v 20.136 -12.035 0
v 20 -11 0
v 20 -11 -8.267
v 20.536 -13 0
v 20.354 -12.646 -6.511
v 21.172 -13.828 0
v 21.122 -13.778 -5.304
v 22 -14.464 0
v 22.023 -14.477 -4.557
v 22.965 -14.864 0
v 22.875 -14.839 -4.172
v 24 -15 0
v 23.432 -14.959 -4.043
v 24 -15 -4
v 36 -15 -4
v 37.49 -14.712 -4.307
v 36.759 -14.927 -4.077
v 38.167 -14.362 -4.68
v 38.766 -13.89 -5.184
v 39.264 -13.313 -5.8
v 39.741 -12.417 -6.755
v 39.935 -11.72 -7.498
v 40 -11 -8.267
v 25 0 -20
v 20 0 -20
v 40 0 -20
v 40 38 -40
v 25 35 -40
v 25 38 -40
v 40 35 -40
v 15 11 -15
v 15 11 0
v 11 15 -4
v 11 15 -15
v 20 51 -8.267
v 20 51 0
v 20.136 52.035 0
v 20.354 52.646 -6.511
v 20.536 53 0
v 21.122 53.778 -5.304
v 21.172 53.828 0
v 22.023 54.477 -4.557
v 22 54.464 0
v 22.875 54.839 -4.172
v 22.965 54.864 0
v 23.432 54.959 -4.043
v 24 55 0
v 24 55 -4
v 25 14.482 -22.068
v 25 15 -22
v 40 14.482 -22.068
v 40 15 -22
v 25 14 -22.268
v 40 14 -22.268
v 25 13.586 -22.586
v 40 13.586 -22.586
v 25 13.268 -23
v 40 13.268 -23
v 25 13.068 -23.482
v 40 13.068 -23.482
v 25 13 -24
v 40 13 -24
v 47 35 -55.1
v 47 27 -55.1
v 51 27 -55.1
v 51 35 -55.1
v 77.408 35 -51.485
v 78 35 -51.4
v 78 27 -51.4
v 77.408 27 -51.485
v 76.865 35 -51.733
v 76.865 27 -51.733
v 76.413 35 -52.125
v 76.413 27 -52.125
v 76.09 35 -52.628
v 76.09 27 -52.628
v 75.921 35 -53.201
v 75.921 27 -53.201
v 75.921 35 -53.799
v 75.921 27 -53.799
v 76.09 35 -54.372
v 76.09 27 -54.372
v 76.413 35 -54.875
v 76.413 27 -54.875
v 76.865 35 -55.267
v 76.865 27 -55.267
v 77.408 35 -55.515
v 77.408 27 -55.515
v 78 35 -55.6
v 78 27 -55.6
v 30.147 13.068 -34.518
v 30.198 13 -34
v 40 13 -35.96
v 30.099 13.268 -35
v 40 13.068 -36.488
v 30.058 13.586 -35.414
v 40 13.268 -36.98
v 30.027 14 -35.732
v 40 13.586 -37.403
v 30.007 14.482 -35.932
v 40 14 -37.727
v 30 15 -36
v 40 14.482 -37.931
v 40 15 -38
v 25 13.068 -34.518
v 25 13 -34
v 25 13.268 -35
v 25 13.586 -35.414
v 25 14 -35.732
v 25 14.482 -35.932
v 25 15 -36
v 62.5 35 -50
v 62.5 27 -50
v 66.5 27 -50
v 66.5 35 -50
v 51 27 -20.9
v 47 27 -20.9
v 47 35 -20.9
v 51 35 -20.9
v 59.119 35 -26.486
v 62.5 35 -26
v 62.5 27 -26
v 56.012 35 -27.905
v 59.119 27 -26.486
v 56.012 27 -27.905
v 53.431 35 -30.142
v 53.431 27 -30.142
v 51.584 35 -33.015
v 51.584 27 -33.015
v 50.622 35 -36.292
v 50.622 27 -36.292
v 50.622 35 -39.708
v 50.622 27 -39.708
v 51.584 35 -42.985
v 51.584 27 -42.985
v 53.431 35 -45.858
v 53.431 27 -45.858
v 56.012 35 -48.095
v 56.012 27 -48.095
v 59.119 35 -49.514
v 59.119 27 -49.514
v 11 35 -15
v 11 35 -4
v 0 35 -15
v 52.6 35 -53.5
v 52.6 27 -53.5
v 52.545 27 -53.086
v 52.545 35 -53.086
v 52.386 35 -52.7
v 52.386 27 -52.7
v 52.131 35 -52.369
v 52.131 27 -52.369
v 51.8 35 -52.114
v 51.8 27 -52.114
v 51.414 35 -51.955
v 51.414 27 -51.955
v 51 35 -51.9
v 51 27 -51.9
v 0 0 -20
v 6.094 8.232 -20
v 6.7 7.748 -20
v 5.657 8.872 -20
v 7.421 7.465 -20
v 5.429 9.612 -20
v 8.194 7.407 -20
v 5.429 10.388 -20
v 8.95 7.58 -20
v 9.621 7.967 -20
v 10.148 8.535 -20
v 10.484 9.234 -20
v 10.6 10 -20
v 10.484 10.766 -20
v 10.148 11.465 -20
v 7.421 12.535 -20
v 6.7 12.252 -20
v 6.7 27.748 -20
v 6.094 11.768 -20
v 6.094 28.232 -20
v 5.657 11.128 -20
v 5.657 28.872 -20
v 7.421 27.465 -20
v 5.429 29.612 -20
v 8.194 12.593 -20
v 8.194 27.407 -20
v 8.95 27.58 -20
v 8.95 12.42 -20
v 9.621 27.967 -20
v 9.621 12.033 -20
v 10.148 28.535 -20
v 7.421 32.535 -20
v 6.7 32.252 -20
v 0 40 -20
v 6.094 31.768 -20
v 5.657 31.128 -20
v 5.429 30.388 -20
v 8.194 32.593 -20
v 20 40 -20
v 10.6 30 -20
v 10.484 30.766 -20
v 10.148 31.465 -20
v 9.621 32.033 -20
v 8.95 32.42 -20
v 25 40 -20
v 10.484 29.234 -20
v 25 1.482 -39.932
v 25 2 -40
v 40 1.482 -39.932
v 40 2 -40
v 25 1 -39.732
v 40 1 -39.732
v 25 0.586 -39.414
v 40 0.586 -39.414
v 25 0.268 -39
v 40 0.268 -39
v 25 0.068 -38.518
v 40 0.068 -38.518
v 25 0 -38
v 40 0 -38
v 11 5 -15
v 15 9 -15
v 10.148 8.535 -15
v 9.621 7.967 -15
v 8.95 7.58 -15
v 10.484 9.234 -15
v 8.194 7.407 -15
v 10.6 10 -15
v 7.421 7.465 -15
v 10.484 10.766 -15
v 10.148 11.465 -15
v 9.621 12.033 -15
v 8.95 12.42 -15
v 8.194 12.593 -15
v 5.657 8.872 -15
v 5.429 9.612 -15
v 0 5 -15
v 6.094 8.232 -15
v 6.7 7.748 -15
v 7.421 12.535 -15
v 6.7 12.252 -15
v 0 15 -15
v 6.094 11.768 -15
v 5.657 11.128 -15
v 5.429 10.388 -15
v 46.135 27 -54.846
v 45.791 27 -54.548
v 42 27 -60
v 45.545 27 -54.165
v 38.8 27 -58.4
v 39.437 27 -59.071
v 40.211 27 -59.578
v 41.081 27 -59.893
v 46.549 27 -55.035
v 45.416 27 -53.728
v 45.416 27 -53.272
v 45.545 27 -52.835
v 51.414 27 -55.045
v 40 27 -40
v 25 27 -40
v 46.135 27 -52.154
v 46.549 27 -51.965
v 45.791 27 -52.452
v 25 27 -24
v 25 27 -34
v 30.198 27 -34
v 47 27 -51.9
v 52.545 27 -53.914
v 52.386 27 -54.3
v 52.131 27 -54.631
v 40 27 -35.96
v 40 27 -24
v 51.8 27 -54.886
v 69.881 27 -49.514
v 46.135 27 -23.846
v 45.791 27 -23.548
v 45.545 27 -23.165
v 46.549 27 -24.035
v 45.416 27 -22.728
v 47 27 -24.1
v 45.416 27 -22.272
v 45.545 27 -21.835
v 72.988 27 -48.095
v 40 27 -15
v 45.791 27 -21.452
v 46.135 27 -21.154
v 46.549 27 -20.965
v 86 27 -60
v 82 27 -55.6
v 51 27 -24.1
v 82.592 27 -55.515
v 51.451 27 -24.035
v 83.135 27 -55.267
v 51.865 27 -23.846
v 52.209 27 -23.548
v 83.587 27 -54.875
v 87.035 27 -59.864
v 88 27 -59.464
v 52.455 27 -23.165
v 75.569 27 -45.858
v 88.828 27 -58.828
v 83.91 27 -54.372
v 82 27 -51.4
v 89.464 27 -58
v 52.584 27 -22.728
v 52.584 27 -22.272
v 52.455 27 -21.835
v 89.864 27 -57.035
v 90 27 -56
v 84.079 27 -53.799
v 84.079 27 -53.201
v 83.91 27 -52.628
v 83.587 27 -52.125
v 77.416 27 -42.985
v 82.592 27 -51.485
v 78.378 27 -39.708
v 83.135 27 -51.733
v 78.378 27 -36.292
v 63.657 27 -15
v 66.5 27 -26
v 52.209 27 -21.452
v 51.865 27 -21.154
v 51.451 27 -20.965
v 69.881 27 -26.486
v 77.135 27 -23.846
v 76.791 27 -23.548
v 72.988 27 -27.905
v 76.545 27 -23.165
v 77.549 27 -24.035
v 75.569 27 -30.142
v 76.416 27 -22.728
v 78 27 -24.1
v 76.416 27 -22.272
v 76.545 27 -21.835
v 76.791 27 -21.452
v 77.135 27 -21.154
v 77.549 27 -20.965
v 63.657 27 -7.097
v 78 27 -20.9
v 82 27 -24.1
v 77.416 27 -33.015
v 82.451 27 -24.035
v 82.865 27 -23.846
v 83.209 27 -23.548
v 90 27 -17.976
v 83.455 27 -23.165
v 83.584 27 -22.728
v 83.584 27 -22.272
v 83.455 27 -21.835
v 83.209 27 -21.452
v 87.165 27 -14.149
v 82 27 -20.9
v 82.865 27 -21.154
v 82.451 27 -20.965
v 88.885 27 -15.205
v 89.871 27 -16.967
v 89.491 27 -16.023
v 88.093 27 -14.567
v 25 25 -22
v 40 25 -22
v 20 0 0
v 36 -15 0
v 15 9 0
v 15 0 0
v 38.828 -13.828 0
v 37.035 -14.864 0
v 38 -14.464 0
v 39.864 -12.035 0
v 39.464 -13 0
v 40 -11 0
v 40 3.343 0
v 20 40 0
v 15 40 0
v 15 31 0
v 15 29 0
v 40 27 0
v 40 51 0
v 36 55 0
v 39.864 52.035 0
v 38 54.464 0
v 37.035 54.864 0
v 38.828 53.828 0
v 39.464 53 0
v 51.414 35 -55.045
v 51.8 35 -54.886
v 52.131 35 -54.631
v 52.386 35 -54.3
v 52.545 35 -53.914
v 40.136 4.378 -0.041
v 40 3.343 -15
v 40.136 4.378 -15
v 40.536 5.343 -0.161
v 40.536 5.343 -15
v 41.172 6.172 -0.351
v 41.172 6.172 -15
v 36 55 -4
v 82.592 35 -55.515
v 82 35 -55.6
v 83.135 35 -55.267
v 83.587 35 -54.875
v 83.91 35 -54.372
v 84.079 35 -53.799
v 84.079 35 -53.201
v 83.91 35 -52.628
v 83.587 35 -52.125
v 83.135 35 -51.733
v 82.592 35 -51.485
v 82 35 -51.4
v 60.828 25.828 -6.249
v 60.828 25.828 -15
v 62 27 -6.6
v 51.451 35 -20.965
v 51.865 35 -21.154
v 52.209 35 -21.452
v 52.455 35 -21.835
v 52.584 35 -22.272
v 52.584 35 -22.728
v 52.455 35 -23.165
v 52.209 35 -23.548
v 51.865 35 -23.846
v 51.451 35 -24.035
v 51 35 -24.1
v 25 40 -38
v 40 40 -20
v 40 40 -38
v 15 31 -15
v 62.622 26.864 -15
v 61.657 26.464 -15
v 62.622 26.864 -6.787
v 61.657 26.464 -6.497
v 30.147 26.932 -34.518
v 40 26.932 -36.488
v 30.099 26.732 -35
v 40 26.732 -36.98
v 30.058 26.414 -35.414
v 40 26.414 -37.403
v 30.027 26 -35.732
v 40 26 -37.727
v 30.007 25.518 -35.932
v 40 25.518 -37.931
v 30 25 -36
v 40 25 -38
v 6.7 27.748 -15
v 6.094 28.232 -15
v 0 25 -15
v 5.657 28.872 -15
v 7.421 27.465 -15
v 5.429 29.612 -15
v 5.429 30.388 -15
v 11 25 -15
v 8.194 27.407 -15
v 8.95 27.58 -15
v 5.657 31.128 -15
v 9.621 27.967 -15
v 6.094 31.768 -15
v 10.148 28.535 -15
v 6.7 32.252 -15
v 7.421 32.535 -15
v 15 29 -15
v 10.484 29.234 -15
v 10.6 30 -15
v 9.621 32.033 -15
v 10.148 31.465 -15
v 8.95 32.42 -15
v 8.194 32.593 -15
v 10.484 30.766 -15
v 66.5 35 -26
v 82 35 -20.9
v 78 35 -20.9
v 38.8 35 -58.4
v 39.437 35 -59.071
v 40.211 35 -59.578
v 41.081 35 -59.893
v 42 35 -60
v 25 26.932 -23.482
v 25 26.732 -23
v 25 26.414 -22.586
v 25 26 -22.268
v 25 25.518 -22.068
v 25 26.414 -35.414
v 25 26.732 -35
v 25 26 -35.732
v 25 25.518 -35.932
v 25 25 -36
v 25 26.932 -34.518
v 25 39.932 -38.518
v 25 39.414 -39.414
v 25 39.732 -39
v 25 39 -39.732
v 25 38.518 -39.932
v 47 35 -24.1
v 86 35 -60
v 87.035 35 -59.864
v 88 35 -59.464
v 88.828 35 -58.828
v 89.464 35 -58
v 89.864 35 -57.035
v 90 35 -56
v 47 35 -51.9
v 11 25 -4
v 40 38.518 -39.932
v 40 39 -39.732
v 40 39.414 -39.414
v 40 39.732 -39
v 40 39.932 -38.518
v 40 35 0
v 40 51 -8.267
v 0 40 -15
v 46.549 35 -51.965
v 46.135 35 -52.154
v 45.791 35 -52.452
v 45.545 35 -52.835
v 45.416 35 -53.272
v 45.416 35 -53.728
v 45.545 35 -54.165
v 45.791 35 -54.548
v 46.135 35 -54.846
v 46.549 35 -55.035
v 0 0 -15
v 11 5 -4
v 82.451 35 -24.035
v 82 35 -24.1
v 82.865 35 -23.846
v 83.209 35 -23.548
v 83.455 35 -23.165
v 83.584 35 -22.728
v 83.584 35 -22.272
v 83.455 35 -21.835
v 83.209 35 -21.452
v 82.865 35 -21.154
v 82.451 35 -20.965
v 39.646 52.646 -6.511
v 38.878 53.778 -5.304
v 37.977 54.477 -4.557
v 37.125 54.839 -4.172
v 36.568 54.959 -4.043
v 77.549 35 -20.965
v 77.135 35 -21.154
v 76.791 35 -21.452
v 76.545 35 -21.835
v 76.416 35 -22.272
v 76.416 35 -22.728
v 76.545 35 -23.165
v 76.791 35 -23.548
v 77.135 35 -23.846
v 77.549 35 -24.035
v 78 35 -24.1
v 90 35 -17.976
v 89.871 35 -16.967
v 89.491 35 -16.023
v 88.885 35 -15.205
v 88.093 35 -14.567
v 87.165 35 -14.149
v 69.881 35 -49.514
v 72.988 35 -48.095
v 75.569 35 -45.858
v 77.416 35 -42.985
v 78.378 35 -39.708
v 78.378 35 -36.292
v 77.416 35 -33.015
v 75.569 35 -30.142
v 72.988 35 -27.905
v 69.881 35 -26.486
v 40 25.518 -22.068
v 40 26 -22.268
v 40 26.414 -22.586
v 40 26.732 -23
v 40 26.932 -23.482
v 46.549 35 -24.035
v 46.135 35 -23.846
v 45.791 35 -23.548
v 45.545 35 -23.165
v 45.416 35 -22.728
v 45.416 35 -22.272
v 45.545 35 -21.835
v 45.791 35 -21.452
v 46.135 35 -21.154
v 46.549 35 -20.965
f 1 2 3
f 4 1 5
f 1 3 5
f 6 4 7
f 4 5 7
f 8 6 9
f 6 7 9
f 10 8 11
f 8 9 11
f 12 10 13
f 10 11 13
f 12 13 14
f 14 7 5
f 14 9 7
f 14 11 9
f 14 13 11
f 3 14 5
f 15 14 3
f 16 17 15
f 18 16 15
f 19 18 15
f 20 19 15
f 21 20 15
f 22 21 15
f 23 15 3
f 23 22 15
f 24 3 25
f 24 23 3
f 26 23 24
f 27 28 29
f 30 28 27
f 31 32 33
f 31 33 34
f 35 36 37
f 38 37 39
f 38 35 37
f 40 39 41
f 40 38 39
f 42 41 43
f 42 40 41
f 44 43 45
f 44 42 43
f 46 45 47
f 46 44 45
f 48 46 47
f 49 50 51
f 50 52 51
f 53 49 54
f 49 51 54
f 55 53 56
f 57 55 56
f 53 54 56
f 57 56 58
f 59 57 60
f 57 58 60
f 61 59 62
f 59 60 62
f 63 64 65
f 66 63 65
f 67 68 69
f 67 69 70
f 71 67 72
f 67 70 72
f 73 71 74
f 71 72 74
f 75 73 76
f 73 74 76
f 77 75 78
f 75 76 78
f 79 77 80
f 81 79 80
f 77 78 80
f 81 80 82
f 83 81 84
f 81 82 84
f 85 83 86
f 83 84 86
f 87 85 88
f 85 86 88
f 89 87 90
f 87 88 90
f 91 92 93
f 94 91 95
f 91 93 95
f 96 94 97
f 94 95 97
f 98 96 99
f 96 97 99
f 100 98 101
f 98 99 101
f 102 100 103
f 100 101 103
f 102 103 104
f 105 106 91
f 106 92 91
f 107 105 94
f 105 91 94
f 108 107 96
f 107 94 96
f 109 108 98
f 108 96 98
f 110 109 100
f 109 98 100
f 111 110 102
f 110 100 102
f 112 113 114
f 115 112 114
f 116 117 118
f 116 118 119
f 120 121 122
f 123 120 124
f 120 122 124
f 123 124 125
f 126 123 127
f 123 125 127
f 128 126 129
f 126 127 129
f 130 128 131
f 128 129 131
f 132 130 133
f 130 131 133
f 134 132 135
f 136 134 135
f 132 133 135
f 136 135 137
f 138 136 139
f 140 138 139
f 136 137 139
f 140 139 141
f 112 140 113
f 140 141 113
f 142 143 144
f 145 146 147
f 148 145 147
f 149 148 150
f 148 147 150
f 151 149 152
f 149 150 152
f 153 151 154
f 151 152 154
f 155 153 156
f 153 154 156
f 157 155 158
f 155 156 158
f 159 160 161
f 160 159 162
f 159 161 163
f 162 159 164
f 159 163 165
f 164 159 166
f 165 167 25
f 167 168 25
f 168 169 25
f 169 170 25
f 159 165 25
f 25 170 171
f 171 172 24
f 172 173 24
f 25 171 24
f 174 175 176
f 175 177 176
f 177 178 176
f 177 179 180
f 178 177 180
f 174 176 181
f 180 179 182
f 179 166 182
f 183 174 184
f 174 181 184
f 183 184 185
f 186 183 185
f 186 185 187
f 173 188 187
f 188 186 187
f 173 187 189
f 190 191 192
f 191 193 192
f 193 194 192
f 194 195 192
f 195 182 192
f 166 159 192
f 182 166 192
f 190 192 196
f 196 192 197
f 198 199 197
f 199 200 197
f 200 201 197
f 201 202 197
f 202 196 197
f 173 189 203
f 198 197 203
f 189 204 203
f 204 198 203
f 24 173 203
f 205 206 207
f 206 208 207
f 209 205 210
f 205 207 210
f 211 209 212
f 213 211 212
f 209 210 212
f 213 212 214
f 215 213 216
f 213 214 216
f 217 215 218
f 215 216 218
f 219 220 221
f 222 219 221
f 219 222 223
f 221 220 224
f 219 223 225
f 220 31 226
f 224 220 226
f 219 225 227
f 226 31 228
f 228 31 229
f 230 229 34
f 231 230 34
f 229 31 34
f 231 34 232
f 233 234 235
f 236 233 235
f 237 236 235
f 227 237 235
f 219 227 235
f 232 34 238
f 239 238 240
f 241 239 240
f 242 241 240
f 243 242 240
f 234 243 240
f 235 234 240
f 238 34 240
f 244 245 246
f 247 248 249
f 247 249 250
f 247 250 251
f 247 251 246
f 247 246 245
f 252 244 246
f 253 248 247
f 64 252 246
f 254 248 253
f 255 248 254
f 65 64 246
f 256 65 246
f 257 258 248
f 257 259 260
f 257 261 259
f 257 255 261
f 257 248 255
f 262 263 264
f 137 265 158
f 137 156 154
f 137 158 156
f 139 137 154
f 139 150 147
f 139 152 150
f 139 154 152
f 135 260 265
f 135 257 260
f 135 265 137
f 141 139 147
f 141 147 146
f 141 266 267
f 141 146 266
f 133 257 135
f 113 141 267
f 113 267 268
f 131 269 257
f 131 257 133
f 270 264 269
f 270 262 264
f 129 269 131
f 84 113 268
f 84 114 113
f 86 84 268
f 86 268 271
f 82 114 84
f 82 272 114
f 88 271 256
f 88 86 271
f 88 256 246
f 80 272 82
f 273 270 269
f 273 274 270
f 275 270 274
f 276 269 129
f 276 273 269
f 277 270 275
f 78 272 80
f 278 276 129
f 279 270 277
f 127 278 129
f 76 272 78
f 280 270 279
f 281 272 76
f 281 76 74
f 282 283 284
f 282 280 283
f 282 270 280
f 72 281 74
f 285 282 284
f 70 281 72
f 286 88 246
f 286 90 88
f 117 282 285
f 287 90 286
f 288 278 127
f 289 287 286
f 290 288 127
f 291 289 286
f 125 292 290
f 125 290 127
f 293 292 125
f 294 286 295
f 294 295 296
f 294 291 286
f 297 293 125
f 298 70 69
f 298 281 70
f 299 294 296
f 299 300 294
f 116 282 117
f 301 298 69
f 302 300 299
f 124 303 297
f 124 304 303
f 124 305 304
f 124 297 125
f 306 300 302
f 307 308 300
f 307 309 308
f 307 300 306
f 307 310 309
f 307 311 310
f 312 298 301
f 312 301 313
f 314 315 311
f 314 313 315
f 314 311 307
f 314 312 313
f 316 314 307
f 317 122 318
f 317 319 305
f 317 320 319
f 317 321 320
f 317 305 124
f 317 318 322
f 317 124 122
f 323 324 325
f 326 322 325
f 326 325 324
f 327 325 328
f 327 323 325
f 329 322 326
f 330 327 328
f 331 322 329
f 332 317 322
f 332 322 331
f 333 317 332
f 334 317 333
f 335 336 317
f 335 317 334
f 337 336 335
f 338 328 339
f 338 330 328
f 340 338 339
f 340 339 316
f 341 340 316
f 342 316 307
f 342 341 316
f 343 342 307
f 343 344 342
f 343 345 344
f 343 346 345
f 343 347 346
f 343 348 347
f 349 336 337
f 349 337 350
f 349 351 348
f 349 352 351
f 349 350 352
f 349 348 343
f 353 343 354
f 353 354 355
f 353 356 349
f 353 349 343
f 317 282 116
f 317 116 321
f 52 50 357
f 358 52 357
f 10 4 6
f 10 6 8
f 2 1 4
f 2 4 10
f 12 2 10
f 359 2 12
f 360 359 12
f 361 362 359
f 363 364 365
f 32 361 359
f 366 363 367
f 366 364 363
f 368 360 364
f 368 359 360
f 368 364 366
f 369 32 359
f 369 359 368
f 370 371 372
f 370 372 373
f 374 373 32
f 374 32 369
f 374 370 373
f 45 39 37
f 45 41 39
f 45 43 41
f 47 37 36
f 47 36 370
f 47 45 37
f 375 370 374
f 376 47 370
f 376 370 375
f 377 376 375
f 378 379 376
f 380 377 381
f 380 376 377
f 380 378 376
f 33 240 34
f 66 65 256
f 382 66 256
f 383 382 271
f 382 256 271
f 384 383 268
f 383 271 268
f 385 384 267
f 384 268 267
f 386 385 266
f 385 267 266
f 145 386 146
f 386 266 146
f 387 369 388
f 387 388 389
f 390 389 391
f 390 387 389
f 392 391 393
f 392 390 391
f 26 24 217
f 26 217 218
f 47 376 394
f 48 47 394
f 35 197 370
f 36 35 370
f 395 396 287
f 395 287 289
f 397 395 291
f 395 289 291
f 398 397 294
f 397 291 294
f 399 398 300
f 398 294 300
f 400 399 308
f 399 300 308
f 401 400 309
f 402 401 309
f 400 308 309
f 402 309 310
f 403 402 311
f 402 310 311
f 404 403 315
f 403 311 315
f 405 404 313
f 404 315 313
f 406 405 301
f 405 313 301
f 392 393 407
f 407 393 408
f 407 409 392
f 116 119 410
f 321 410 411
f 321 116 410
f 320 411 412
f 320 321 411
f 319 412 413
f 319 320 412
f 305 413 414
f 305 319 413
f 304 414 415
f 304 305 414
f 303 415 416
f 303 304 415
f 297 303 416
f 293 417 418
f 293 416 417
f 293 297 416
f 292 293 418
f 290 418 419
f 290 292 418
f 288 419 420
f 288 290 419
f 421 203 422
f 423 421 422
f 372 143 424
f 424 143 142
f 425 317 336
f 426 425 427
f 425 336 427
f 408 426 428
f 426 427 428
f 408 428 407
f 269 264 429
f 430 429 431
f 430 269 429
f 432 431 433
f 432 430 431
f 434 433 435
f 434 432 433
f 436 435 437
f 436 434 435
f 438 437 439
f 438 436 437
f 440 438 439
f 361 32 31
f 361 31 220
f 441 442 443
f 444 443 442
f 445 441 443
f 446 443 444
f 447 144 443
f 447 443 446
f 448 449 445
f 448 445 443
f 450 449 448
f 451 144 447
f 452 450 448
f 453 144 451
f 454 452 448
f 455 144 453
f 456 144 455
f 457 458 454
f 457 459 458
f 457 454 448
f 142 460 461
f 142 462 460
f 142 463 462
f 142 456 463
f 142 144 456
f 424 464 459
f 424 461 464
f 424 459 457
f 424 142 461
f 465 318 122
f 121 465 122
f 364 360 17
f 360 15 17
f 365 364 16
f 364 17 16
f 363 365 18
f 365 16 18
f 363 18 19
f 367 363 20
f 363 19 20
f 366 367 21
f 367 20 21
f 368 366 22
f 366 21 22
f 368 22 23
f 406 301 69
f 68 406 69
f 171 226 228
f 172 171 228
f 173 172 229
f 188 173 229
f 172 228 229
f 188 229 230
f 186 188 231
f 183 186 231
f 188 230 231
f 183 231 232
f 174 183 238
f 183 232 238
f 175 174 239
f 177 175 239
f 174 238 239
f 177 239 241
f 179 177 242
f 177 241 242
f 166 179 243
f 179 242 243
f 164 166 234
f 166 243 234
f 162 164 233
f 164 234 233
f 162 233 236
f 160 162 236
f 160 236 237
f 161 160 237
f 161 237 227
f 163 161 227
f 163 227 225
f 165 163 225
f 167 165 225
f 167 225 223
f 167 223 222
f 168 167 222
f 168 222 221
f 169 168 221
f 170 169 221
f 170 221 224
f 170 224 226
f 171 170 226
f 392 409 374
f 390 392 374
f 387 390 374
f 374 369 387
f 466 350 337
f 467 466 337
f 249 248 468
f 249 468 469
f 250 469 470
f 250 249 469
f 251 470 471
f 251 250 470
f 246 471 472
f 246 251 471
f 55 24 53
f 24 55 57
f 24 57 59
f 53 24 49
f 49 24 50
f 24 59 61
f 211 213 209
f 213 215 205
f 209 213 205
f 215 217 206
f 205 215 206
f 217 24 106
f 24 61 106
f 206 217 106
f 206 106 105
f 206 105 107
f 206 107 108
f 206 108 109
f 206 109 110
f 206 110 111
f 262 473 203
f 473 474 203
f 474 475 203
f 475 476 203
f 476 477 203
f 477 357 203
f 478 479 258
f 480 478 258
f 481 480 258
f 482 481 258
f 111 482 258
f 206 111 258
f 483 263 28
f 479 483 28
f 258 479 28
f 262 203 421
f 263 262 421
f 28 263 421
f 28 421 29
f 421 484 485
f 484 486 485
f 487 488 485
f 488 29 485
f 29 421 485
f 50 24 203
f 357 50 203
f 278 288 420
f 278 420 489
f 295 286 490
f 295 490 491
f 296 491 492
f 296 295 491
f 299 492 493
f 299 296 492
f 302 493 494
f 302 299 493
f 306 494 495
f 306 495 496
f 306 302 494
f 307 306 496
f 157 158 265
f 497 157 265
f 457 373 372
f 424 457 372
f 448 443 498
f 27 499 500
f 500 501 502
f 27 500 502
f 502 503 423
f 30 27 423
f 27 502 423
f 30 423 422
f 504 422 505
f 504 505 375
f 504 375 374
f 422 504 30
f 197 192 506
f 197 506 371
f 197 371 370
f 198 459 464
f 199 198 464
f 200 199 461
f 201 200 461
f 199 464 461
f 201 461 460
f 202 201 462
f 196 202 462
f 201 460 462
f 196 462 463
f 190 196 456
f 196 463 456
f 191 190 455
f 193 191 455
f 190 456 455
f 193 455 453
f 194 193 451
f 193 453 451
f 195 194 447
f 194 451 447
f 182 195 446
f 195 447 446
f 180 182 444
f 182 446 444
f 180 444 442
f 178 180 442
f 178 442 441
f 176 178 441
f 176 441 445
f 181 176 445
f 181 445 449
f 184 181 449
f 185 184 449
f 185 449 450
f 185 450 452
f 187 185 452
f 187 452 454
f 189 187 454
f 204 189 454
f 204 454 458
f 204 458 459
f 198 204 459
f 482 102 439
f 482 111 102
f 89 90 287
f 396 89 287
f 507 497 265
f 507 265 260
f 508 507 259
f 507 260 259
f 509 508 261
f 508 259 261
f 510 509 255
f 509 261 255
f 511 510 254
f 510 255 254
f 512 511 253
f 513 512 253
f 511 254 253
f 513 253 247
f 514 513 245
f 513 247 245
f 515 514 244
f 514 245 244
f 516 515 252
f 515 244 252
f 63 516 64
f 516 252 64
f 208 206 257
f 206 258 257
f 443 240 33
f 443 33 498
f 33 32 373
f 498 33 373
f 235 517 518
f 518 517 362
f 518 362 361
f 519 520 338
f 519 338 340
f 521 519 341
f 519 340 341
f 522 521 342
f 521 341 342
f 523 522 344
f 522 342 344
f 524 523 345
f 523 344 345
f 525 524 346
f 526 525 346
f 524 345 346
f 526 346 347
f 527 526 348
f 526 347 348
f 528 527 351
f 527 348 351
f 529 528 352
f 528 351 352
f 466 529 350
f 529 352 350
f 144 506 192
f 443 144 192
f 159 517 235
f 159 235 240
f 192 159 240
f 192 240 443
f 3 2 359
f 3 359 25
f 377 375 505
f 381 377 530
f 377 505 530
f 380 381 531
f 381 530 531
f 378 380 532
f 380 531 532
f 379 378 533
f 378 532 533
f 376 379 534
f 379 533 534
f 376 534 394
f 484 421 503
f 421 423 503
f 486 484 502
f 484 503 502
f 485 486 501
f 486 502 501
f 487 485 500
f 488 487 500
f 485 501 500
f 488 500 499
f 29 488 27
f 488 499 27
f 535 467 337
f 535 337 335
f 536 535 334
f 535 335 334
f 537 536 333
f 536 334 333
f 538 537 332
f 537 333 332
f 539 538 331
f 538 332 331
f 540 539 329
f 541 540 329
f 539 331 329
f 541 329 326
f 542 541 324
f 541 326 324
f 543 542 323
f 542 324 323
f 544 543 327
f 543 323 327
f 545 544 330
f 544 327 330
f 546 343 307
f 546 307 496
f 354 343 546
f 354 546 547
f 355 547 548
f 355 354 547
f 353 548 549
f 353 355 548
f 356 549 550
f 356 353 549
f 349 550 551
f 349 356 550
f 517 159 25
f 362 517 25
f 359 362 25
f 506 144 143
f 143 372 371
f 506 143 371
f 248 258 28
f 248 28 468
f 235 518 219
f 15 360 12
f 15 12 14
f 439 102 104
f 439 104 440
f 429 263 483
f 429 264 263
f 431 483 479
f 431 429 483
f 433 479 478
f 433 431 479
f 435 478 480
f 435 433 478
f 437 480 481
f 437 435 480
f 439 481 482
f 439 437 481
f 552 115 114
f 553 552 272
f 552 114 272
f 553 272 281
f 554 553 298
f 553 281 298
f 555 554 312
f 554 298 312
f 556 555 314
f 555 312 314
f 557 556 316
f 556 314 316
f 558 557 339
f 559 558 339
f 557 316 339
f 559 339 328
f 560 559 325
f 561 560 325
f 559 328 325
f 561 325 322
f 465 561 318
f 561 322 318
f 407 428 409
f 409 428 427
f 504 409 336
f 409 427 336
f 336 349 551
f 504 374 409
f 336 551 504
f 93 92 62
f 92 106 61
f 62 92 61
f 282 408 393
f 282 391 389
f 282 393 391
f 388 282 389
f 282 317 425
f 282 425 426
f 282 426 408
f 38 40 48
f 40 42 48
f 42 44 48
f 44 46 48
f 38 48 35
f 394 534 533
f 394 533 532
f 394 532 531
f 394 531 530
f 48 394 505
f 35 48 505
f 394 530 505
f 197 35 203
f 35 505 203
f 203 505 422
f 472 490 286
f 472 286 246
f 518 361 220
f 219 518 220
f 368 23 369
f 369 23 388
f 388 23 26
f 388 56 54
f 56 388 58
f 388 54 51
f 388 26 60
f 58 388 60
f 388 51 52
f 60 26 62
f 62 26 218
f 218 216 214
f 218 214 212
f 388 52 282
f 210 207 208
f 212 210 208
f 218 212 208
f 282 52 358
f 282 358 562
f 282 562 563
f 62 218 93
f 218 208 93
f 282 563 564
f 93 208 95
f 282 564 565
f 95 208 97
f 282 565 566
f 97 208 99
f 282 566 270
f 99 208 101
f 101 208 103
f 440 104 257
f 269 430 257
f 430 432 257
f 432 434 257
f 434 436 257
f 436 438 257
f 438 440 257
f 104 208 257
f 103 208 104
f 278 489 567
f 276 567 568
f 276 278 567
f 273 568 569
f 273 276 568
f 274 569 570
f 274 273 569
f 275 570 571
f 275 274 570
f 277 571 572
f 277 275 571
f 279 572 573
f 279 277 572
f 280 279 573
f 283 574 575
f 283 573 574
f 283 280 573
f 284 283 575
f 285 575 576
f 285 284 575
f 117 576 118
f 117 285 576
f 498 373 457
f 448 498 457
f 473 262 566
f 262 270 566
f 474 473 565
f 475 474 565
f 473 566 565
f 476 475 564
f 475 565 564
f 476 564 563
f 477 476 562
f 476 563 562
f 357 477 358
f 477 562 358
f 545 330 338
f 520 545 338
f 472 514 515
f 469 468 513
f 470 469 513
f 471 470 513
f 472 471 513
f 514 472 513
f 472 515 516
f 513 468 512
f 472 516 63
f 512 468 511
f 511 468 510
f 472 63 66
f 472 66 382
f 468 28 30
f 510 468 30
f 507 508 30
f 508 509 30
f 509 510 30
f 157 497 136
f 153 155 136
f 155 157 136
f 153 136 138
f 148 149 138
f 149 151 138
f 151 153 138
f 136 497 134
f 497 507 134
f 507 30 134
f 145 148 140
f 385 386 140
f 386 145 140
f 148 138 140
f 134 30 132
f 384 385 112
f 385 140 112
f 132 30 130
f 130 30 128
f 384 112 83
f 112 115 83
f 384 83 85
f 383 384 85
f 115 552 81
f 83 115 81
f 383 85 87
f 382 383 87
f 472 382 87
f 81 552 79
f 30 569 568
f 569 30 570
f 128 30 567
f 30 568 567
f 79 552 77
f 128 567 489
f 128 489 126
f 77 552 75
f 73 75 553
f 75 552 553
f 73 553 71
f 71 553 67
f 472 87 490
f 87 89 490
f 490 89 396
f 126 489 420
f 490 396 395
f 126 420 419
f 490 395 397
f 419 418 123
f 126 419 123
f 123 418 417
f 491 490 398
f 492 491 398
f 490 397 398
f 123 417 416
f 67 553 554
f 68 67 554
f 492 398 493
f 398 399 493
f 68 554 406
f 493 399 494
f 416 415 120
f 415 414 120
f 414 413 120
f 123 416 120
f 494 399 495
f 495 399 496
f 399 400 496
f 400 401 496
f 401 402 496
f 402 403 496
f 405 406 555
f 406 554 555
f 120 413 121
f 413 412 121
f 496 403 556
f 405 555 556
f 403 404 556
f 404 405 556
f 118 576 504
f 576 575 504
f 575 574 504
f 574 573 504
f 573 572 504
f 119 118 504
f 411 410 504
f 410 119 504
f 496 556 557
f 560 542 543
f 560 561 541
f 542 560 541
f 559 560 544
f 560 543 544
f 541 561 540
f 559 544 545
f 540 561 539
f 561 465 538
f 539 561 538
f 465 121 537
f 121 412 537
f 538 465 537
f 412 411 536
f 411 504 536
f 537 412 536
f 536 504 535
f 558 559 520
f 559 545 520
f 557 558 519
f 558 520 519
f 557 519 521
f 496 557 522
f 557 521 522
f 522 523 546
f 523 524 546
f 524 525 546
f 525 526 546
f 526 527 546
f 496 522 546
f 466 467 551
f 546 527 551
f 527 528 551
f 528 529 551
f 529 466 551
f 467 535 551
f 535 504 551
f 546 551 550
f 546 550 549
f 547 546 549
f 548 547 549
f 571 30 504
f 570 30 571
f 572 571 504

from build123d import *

# Parameters (mm, degrees)
SKETCH1_W                = 40
SKETCH1_H                = 40
BOSS_EXTRUDE1_DEPTH      = 40
SKETCH2_W                = 25
SKETCH2_H                = 20
CUT_EXTRUDE1_DEPTH       = 40
CHAMFER1_SIZE            = 15
CUT_EXTRUDE2_DEPTH       = 15
CHAMFER2_SIZE            = 4
SKETCH4_R                = 2.6
CUT_EXTRUDE3_DEPTH       = 17
BOSS_EXTRUDE3_DEPTH      = 20
FILLET3_R                = 4
BOSS_EXTRUDE2_DEPTH      = 20
BOSS_EXTRUDE2_DEPTH_BACK = 25
SKETCH5_W                = 50
SKETCH5_H                = 8
CUT_EXTRUDE4_DEPTH       = 10
CHAMFER3_SIZE            = 15
CHAMFER3_SIZE_2          = 20
CHAMFER4_SIZE2           = 50
CHAMFER4_SIZE            = 15
FILLET5_START            = 26
FILLET5_DEPTH            = 10
FILLET6_R                = 2
CHAMFER5_START           = -40
CHAMFER5_DEPTH           = 40
CHAMFER5_START_2         = 2
CHAMFER5_2_DEPTH         = 25
SKETCH11_W               = 27.237482008
SKETCH11_H               = 25
CUT_EXTRUDE5_DEPTH       = 25
FILLET7_R                = 4
SKETCH16_W               = 14
SKETCH16_H               = 14
CUT_EXTRUDE6_DEPTH       = 43
CHAMFER6_SIZE            = 10
CHAMFER6_SIZE2           = 2
FILLET9_R                = 2


with BuildPart() as part:
    # Sketch1 → Boss-Extrude1 (new body)
    with BuildSketch(Plane(origin=(0, 0, 0), x_dir=(1, 0, 0), z_dir=(0, 1, 0))):
        with Locations((20, 20)):
            Rectangle(SKETCH1_W, SKETCH1_H)
    extrude(amount=BOSS_EXTRUDE1_DEPTH)

    # Sketch2 → Cut-Extrude1 (cut)
    with BuildSketch(Plane(origin=(0, 40, 0), x_dir=(1, 0, 0), z_dir=(0, 1, 0))):
        with Locations((12.5, 30)):
            Rectangle(SKETCH2_W, SKETCH2_H)
    extrude(amount=-CUT_EXTRUDE1_DEPTH, mode=Mode.SUBTRACT)

    # Chamfer1
    chamfer1_edges = [part.edges().sort_by_distance(p)[0] for p in [
        (0, 20, 0),
    ]]
    chamfer(chamfer1_edges, length=CHAMFER1_SIZE)

    # Sketch3 → Cut-Extrude2 (cut)
    with BuildSketch(Plane.XY):
        Polygon((0, 10), (0, 15), (15, 15), (15, 5), (0, 5), align=None)
        Polygon((0, 30), (0, 25), (15, 25), (15, 35), (0, 35), align=None)
    extrude(amount=-CUT_EXTRUDE2_DEPTH, mode=Mode.SUBTRACT)

    # Chamfer2
    chamfer2_edges = [part.edges().sort_by_distance(p)[0] for p in [
        (15, 35, -7.5),
        (15, 25, -7.5),
        (15, 15, -7.5),
        (15, 5, -7.5),
    ]]
    chamfer(chamfer2_edges, length=CHAMFER2_SIZE)

    # Sketch4 → Cut-Extrude3 (cut)
    with BuildSketch(Plane.XY.offset(-15)):
        with Locations((8, 30)):
            Circle(SKETCH4_R)
        with Locations((8, 10)):
            Circle(SKETCH4_R)
    extrude(amount=-CUT_EXTRUDE3_DEPTH, mode=Mode.SUBTRACT)

    # Sketch9 → Boss-Extrude3 (add)
    with BuildSketch(Plane(origin=(40, 0, 0), x_dir=(0, 0, -1), z_dir=(1, 0, 0))):
        Polygon((0, 40), (0, 55), (4, 55), (20, 40), align=None)
        Polygon((0, 0), (0, -15), (4, -15), (20, 0), align=None)
    extrude(amount=-BOSS_EXTRUDE3_DEPTH)

    # Fillet3
    fillet3_edges = [part.edges().sort_by_distance(p)[0] for p in [
        (20, 55, -2),
        (40, 55, -2),
        (20, -15, -2),
        (40, -15, -2),
    ]]
    fillet(fillet3_edges, radius=FILLET3_R)

    # Sketch5 → Boss-Extrude2 (add, two sides: drawn at the far end of the back side and taken through both)
    with BuildSketch(Plane(origin=(0, 0, -40), x_dir=(-1, 0, 0), z_dir=(0, 0, -1)).offset(-BOSS_EXTRUDE2_DEPTH_BACK)):
        with Locations((-65, 31)):
            Rectangle(SKETCH5_W, SKETCH5_H)
    extrude(amount=BOSS_EXTRUDE2_DEPTH + BOSS_EXTRUDE2_DEPTH_BACK)

    # Sketch10 → Cut-Extrude4 (cut)
    with BuildSketch(Plane(origin=(0, 27, 0), x_dir=(-1, 0, 0), z_dir=(0, -1, 0))):
        with BuildLine():
            ThreePointArc((-47, 51.9), (-45.4, 53.5), (-47, 55.1))
            Line((-47, 55.1), (-51, 55.1))
            ThreePointArc((-51, 55.1), (-52.13137085, 54.63137085), (-52.6, 53.5))
            ThreePointArc((-52.6, 53.5), (-52.13137085, 52.36862915), (-51, 51.9))
            Line((-51, 51.9), (-47, 51.9))
        make_face()
        with BuildLine():
            ThreePointArc((-47, 20.9), (-45.4, 22.5), (-47, 24.1))
            Line((-47, 24.1), (-51, 24.1))
            ThreePointArc((-51, 24.1), (-52.6, 22.5), (-51, 20.9))
            Line((-51, 20.9), (-47, 20.9))
        make_face()
        with BuildLine():
            ThreePointArc((-78, 20.9), (-76.4, 22.5), (-78, 24.1))
            Line((-78, 24.1), (-82, 24.1))
            ThreePointArc((-82, 24.1), (-83.6, 22.5), (-82, 20.9))
            Line((-82, 20.9), (-78, 20.9))
        make_face()
        with BuildLine():
            ThreePointArc((-66.5, 50), (-78.5, 38), (-66.5, 26))
            Line((-66.5, 26), (-62.5, 26))
            ThreePointArc((-62.5, 26), (-50.5, 38), (-62.5, 50))
            Line((-62.5, 50), (-66.5, 50))
        make_face()
        with BuildLine():
            ThreePointArc((-78, 51.4), (-75.9, 53.5), (-78, 55.6))
            Line((-78, 55.6), (-82, 55.6))
            ThreePointArc((-82, 55.6), (-84.1, 53.5), (-82, 51.4))
            Line((-82, 51.4), (-78, 51.4))
        make_face()
    extrude(amount=-CUT_EXTRUDE4_DEPTH, mode=Mode.SUBTRACT)

    # Chamfer3
    # the kernel refuses this chamfer: 20, 15 mm, written as the material it adds along each edge
    with BuildSketch(Plane(origin=(40, 27, -40), x_dir=(-1, 0, 0), z_dir=(0, 1, 0))) as chamfer3_piece_1:
        Polygon((CHAMFER3_SIZE, 0), (0, -CHAMFER3_SIZE_2), (0, 0), align=None)
    extrude(amount=8)

    # Chamfer4
    chamfer4_edges = [part.edges().sort_by_distance(p)[0] for p in [
        (40, 31, -15),
    ]]
    chamfer4_side = [part.faces().sort_by_distance(p)[0] for p in [
        (40, 31, -14.7),
    ]]
    chamfer(chamfer4_edges, length=CHAMFER4_SIZE - 0.0001, length2=CHAMFER4_SIZE2 - 0.0001, reference=chamfer4_side[0])  # a hair under: the kernel refuses the full size

    # Fillet5: read off the stored shape, not the designer's step
    # Fillet5 outline → Fillet5 (cut)
    with BuildSketch(Plane(origin=(0, 0, 0), x_dir=(1, 0, 0), z_dir=(0, 1, 0)).offset(FILLET5_START)):
        with BuildLine():
            Line((90, 15), (90, 17.976122604))
            ThreePointArc((90, 17.976122604), (89.209171713, 15.588400485), (87.149391542, 14.144817463))
            Line((87.149391542, 14.144817463), (90, 15))
        make_face()
        with BuildLine():
            ThreePointArc((38.8, 58.4), (40.211145618, 59.577708764), (42, 60))
            Line((42, 60), (40, 60))
            Line((40, 60), (38.8, 58.4))
        make_face()
        with BuildLine():
            ThreePointArc((86, 60), (88.828427125, 58.828427125), (90, 56))
            Line((90, 56), (90, 60))
            Line((90, 60), (86, 60))
        make_face()
    extrude(amount=FILLET5_DEPTH, mode=Mode.SUBTRACT)

    # Fillet6
    fillet6_edges = [part.edges().sort_by_distance(p)[0] for p in [
        (32.5, 40, -40),
        (32.5, 0, -40),
    ]]
    fillet(fillet6_edges, radius=FILLET6_R)

    # Chamfer5: read off the stored shape, not the designer's step
    # Chamfer5 outline → Chamfer5 (add)
    with BuildSketch(Plane.XY.offset(CHAMFER5_START)):
        Polygon((40, 5), (62, 27), (40, 27), align=None)
    extrude(amount=CHAMFER5_DEPTH)

    # Chamfer5 2 outline → Chamfer5 2 (cut)
    with BuildSketch(Plane(origin=(0, 0, 0), x_dir=(1, 0, 0), z_dir=(0, 1, 0)).offset(CHAMFER5_START_2)):
        with BuildLine():
            Line((51, 24.1), (47, 24.1))
            ThreePointArc((47, 24.1), (45.4, 22.5), (47, 20.9))
            Line((47, 20.9), (51, 20.9))
            ThreePointArc((51, 20.9), (52.6, 22.5), (51, 24.1))
        make_face()
        with BuildLine():
            ThreePointArc((50.667840434, 40), (53.33484861, 30.254033308), (62.5, 26))
            Line((62.5, 26), (64, 26))
            Line((64, 26), (64, 40))
            Line((64, 40), (50.667840434, 40))
        make_face()
        Polygon((64, 0), (64, 7.2), (40, 0), align=None)
    extrude(amount=CHAMFER5_2_DEPTH, mode=Mode.SUBTRACT)

    # Sketch11 → Cut-Extrude5 (cut)
    with BuildSketch(Plane(origin=(0, 0, -40), x_dir=(-1, 0, 0), z_dir=(0, 0, -1))):
        with Locations((-53.618741004, 14.5)):
            Rectangle(SKETCH11_W, SKETCH11_H)
    extrude(amount=-CUT_EXTRUDE5_DEPTH, mode=Mode.SUBTRACT)

    # Fillet7
    fillet7_edges = [part.edges().sort_by_distance(p)[0] for p in [
        (62, 27, -10.8000346),
        (40, 5, -7.5),
    ]]
    fillet(fillet7_edges, radius=FILLET7_R)

    # Sketch16 → Cut-Extrude6 (cut)
    with BuildSketch(Plane.ZY):
        with Locations((-29, 20)):
            Rectangle(SKETCH16_W, SKETCH16_H)
    extrude(amount=-CUT_EXTRUDE6_DEPTH, mode=Mode.SUBTRACT)

    # Chamfer6
    chamfer6_edges = [part.edges().sort_by_distance(p)[0] for p in [
        (40, 20, -36),
    ]]
    chamfer6_side = [part.faces().sort_by_distance(p)[0] for p in [
        (32.5, 20, -36),
    ]]
    chamfer(chamfer6_edges, length=CHAMFER6_SIZE, length2=CHAMFER6_SIZE2, reference=chamfer6_side[0])

    # Fillet9
    fillet9_edges = [part.edges().sort_by_distance(p)[0] for p in [
        (32.5, 13, -22),
        (32.5, 27, -22),
        (27.5, 27, -36),
        (27.5, 13, -36),
        (35, 13, -37),
        (35, 27, -37),
    ]]
    fillet(fillet9_edges, radius=FILLET9_R)


solid = part.part
